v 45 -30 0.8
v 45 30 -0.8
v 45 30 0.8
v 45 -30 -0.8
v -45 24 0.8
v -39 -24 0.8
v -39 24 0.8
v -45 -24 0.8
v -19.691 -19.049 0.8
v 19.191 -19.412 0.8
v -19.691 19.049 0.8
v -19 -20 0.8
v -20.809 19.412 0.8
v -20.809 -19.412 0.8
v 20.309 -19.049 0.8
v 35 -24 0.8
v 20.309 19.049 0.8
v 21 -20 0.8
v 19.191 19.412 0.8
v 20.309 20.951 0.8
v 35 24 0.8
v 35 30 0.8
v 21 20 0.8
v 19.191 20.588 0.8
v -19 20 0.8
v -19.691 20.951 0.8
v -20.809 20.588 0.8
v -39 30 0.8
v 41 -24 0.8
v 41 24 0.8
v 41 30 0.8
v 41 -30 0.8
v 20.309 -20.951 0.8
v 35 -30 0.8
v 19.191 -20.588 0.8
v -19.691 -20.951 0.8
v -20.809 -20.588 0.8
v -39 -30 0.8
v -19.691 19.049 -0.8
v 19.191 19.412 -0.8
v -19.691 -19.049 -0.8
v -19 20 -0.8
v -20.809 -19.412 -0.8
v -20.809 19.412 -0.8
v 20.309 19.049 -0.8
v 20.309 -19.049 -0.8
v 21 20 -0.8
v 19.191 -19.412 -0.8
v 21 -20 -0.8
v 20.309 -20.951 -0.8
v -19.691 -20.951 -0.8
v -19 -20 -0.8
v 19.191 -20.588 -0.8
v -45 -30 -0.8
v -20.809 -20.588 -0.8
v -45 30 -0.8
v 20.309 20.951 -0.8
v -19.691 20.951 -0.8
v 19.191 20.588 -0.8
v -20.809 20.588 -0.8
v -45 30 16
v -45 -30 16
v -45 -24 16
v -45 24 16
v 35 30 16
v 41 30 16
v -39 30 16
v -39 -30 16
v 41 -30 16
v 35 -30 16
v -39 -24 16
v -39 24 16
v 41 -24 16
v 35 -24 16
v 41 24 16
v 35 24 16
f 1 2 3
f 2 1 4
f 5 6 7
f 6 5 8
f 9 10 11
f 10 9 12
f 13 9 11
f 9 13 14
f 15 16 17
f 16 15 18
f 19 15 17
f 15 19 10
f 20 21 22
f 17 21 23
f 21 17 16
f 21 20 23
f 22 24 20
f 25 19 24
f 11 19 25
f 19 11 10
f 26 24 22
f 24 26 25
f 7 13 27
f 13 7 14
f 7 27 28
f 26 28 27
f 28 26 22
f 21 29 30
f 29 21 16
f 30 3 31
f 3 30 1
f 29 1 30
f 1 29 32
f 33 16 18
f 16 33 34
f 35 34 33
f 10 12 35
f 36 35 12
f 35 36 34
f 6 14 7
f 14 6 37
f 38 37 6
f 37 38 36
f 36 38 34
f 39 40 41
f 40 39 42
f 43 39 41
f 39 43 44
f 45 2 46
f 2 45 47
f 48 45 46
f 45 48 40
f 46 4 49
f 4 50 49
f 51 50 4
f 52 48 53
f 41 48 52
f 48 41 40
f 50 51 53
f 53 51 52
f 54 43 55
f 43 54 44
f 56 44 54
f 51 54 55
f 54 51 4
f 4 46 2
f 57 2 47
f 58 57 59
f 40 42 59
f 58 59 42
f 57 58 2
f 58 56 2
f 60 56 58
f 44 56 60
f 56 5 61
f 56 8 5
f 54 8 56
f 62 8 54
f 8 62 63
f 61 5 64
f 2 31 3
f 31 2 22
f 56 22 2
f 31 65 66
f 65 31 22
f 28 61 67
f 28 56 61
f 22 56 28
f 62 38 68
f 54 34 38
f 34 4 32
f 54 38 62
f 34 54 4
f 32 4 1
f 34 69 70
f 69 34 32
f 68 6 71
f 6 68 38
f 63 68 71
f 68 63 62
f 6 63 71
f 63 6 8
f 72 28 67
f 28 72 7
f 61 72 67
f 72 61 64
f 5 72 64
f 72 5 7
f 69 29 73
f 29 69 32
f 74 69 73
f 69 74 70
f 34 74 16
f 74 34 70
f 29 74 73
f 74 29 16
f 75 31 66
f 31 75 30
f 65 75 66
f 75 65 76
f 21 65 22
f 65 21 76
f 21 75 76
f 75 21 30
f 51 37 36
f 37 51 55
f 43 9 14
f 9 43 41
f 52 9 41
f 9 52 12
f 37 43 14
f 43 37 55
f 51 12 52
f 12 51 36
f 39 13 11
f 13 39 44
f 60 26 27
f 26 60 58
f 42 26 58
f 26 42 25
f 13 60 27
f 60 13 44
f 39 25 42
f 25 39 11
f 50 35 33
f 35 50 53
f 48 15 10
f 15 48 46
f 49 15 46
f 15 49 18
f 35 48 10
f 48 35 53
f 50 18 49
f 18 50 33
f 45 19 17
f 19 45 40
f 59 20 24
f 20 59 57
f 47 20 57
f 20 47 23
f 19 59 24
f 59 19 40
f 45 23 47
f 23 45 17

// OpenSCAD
// file: constants.scad
/*
 * Written by Dermot Tynan, Kalopa Research.
 * GPLv2.
 *
 * This file has all the constants for the OpenWing sail.
 *
 * All dimensions are in mm.
 */

bearing_inner_radius = 4.0;
bearing_outer_radius = 11.0 * 1.02;
bearing_height = 7.0;

mast_clearance_radius = 5.0;

a_section_chord = 133.0;

le_tube_radius = 4.0 * 1.0625;

te_depth = 6.4;
te_width = 20.0;
// main file
/*
 * Written by Dermot Tynan, Kalopa Research.
 * GPLv2.
 *
 * This is the jig for glueing the struts to the leading and
 * trailing edges.
 *
 * All dimensions are in mm.
 */
include <constants.scad>

module strut_jig()
{
	difference() {
		union() {
			cube([90, 60, 1.6], center = true);
			translate([-42, -27, 8]) cube([6, 6, 16], center = true);
			translate([-42, 27, 8]) cube([6, 6, 16], center = true);
			translate([38, -27, 8]) cube([6, 6, 16], center = true);
			translate([38, 27, 8]) cube([6, 6, 16], center = true);
		}
		translate([-20, -20, 0]) cylinder(r = 1, h = 4, center = true);
		translate([-20, 20, 0]) cylinder(r = 1, h = 4, center = true);
		translate([20, -20, 0]) cylinder(r = 1, h = 4, center = true);
		translate([20, 20, 0]) cylinder(r = 1, h = 4, center = true);
	}
}

strut_jig();
